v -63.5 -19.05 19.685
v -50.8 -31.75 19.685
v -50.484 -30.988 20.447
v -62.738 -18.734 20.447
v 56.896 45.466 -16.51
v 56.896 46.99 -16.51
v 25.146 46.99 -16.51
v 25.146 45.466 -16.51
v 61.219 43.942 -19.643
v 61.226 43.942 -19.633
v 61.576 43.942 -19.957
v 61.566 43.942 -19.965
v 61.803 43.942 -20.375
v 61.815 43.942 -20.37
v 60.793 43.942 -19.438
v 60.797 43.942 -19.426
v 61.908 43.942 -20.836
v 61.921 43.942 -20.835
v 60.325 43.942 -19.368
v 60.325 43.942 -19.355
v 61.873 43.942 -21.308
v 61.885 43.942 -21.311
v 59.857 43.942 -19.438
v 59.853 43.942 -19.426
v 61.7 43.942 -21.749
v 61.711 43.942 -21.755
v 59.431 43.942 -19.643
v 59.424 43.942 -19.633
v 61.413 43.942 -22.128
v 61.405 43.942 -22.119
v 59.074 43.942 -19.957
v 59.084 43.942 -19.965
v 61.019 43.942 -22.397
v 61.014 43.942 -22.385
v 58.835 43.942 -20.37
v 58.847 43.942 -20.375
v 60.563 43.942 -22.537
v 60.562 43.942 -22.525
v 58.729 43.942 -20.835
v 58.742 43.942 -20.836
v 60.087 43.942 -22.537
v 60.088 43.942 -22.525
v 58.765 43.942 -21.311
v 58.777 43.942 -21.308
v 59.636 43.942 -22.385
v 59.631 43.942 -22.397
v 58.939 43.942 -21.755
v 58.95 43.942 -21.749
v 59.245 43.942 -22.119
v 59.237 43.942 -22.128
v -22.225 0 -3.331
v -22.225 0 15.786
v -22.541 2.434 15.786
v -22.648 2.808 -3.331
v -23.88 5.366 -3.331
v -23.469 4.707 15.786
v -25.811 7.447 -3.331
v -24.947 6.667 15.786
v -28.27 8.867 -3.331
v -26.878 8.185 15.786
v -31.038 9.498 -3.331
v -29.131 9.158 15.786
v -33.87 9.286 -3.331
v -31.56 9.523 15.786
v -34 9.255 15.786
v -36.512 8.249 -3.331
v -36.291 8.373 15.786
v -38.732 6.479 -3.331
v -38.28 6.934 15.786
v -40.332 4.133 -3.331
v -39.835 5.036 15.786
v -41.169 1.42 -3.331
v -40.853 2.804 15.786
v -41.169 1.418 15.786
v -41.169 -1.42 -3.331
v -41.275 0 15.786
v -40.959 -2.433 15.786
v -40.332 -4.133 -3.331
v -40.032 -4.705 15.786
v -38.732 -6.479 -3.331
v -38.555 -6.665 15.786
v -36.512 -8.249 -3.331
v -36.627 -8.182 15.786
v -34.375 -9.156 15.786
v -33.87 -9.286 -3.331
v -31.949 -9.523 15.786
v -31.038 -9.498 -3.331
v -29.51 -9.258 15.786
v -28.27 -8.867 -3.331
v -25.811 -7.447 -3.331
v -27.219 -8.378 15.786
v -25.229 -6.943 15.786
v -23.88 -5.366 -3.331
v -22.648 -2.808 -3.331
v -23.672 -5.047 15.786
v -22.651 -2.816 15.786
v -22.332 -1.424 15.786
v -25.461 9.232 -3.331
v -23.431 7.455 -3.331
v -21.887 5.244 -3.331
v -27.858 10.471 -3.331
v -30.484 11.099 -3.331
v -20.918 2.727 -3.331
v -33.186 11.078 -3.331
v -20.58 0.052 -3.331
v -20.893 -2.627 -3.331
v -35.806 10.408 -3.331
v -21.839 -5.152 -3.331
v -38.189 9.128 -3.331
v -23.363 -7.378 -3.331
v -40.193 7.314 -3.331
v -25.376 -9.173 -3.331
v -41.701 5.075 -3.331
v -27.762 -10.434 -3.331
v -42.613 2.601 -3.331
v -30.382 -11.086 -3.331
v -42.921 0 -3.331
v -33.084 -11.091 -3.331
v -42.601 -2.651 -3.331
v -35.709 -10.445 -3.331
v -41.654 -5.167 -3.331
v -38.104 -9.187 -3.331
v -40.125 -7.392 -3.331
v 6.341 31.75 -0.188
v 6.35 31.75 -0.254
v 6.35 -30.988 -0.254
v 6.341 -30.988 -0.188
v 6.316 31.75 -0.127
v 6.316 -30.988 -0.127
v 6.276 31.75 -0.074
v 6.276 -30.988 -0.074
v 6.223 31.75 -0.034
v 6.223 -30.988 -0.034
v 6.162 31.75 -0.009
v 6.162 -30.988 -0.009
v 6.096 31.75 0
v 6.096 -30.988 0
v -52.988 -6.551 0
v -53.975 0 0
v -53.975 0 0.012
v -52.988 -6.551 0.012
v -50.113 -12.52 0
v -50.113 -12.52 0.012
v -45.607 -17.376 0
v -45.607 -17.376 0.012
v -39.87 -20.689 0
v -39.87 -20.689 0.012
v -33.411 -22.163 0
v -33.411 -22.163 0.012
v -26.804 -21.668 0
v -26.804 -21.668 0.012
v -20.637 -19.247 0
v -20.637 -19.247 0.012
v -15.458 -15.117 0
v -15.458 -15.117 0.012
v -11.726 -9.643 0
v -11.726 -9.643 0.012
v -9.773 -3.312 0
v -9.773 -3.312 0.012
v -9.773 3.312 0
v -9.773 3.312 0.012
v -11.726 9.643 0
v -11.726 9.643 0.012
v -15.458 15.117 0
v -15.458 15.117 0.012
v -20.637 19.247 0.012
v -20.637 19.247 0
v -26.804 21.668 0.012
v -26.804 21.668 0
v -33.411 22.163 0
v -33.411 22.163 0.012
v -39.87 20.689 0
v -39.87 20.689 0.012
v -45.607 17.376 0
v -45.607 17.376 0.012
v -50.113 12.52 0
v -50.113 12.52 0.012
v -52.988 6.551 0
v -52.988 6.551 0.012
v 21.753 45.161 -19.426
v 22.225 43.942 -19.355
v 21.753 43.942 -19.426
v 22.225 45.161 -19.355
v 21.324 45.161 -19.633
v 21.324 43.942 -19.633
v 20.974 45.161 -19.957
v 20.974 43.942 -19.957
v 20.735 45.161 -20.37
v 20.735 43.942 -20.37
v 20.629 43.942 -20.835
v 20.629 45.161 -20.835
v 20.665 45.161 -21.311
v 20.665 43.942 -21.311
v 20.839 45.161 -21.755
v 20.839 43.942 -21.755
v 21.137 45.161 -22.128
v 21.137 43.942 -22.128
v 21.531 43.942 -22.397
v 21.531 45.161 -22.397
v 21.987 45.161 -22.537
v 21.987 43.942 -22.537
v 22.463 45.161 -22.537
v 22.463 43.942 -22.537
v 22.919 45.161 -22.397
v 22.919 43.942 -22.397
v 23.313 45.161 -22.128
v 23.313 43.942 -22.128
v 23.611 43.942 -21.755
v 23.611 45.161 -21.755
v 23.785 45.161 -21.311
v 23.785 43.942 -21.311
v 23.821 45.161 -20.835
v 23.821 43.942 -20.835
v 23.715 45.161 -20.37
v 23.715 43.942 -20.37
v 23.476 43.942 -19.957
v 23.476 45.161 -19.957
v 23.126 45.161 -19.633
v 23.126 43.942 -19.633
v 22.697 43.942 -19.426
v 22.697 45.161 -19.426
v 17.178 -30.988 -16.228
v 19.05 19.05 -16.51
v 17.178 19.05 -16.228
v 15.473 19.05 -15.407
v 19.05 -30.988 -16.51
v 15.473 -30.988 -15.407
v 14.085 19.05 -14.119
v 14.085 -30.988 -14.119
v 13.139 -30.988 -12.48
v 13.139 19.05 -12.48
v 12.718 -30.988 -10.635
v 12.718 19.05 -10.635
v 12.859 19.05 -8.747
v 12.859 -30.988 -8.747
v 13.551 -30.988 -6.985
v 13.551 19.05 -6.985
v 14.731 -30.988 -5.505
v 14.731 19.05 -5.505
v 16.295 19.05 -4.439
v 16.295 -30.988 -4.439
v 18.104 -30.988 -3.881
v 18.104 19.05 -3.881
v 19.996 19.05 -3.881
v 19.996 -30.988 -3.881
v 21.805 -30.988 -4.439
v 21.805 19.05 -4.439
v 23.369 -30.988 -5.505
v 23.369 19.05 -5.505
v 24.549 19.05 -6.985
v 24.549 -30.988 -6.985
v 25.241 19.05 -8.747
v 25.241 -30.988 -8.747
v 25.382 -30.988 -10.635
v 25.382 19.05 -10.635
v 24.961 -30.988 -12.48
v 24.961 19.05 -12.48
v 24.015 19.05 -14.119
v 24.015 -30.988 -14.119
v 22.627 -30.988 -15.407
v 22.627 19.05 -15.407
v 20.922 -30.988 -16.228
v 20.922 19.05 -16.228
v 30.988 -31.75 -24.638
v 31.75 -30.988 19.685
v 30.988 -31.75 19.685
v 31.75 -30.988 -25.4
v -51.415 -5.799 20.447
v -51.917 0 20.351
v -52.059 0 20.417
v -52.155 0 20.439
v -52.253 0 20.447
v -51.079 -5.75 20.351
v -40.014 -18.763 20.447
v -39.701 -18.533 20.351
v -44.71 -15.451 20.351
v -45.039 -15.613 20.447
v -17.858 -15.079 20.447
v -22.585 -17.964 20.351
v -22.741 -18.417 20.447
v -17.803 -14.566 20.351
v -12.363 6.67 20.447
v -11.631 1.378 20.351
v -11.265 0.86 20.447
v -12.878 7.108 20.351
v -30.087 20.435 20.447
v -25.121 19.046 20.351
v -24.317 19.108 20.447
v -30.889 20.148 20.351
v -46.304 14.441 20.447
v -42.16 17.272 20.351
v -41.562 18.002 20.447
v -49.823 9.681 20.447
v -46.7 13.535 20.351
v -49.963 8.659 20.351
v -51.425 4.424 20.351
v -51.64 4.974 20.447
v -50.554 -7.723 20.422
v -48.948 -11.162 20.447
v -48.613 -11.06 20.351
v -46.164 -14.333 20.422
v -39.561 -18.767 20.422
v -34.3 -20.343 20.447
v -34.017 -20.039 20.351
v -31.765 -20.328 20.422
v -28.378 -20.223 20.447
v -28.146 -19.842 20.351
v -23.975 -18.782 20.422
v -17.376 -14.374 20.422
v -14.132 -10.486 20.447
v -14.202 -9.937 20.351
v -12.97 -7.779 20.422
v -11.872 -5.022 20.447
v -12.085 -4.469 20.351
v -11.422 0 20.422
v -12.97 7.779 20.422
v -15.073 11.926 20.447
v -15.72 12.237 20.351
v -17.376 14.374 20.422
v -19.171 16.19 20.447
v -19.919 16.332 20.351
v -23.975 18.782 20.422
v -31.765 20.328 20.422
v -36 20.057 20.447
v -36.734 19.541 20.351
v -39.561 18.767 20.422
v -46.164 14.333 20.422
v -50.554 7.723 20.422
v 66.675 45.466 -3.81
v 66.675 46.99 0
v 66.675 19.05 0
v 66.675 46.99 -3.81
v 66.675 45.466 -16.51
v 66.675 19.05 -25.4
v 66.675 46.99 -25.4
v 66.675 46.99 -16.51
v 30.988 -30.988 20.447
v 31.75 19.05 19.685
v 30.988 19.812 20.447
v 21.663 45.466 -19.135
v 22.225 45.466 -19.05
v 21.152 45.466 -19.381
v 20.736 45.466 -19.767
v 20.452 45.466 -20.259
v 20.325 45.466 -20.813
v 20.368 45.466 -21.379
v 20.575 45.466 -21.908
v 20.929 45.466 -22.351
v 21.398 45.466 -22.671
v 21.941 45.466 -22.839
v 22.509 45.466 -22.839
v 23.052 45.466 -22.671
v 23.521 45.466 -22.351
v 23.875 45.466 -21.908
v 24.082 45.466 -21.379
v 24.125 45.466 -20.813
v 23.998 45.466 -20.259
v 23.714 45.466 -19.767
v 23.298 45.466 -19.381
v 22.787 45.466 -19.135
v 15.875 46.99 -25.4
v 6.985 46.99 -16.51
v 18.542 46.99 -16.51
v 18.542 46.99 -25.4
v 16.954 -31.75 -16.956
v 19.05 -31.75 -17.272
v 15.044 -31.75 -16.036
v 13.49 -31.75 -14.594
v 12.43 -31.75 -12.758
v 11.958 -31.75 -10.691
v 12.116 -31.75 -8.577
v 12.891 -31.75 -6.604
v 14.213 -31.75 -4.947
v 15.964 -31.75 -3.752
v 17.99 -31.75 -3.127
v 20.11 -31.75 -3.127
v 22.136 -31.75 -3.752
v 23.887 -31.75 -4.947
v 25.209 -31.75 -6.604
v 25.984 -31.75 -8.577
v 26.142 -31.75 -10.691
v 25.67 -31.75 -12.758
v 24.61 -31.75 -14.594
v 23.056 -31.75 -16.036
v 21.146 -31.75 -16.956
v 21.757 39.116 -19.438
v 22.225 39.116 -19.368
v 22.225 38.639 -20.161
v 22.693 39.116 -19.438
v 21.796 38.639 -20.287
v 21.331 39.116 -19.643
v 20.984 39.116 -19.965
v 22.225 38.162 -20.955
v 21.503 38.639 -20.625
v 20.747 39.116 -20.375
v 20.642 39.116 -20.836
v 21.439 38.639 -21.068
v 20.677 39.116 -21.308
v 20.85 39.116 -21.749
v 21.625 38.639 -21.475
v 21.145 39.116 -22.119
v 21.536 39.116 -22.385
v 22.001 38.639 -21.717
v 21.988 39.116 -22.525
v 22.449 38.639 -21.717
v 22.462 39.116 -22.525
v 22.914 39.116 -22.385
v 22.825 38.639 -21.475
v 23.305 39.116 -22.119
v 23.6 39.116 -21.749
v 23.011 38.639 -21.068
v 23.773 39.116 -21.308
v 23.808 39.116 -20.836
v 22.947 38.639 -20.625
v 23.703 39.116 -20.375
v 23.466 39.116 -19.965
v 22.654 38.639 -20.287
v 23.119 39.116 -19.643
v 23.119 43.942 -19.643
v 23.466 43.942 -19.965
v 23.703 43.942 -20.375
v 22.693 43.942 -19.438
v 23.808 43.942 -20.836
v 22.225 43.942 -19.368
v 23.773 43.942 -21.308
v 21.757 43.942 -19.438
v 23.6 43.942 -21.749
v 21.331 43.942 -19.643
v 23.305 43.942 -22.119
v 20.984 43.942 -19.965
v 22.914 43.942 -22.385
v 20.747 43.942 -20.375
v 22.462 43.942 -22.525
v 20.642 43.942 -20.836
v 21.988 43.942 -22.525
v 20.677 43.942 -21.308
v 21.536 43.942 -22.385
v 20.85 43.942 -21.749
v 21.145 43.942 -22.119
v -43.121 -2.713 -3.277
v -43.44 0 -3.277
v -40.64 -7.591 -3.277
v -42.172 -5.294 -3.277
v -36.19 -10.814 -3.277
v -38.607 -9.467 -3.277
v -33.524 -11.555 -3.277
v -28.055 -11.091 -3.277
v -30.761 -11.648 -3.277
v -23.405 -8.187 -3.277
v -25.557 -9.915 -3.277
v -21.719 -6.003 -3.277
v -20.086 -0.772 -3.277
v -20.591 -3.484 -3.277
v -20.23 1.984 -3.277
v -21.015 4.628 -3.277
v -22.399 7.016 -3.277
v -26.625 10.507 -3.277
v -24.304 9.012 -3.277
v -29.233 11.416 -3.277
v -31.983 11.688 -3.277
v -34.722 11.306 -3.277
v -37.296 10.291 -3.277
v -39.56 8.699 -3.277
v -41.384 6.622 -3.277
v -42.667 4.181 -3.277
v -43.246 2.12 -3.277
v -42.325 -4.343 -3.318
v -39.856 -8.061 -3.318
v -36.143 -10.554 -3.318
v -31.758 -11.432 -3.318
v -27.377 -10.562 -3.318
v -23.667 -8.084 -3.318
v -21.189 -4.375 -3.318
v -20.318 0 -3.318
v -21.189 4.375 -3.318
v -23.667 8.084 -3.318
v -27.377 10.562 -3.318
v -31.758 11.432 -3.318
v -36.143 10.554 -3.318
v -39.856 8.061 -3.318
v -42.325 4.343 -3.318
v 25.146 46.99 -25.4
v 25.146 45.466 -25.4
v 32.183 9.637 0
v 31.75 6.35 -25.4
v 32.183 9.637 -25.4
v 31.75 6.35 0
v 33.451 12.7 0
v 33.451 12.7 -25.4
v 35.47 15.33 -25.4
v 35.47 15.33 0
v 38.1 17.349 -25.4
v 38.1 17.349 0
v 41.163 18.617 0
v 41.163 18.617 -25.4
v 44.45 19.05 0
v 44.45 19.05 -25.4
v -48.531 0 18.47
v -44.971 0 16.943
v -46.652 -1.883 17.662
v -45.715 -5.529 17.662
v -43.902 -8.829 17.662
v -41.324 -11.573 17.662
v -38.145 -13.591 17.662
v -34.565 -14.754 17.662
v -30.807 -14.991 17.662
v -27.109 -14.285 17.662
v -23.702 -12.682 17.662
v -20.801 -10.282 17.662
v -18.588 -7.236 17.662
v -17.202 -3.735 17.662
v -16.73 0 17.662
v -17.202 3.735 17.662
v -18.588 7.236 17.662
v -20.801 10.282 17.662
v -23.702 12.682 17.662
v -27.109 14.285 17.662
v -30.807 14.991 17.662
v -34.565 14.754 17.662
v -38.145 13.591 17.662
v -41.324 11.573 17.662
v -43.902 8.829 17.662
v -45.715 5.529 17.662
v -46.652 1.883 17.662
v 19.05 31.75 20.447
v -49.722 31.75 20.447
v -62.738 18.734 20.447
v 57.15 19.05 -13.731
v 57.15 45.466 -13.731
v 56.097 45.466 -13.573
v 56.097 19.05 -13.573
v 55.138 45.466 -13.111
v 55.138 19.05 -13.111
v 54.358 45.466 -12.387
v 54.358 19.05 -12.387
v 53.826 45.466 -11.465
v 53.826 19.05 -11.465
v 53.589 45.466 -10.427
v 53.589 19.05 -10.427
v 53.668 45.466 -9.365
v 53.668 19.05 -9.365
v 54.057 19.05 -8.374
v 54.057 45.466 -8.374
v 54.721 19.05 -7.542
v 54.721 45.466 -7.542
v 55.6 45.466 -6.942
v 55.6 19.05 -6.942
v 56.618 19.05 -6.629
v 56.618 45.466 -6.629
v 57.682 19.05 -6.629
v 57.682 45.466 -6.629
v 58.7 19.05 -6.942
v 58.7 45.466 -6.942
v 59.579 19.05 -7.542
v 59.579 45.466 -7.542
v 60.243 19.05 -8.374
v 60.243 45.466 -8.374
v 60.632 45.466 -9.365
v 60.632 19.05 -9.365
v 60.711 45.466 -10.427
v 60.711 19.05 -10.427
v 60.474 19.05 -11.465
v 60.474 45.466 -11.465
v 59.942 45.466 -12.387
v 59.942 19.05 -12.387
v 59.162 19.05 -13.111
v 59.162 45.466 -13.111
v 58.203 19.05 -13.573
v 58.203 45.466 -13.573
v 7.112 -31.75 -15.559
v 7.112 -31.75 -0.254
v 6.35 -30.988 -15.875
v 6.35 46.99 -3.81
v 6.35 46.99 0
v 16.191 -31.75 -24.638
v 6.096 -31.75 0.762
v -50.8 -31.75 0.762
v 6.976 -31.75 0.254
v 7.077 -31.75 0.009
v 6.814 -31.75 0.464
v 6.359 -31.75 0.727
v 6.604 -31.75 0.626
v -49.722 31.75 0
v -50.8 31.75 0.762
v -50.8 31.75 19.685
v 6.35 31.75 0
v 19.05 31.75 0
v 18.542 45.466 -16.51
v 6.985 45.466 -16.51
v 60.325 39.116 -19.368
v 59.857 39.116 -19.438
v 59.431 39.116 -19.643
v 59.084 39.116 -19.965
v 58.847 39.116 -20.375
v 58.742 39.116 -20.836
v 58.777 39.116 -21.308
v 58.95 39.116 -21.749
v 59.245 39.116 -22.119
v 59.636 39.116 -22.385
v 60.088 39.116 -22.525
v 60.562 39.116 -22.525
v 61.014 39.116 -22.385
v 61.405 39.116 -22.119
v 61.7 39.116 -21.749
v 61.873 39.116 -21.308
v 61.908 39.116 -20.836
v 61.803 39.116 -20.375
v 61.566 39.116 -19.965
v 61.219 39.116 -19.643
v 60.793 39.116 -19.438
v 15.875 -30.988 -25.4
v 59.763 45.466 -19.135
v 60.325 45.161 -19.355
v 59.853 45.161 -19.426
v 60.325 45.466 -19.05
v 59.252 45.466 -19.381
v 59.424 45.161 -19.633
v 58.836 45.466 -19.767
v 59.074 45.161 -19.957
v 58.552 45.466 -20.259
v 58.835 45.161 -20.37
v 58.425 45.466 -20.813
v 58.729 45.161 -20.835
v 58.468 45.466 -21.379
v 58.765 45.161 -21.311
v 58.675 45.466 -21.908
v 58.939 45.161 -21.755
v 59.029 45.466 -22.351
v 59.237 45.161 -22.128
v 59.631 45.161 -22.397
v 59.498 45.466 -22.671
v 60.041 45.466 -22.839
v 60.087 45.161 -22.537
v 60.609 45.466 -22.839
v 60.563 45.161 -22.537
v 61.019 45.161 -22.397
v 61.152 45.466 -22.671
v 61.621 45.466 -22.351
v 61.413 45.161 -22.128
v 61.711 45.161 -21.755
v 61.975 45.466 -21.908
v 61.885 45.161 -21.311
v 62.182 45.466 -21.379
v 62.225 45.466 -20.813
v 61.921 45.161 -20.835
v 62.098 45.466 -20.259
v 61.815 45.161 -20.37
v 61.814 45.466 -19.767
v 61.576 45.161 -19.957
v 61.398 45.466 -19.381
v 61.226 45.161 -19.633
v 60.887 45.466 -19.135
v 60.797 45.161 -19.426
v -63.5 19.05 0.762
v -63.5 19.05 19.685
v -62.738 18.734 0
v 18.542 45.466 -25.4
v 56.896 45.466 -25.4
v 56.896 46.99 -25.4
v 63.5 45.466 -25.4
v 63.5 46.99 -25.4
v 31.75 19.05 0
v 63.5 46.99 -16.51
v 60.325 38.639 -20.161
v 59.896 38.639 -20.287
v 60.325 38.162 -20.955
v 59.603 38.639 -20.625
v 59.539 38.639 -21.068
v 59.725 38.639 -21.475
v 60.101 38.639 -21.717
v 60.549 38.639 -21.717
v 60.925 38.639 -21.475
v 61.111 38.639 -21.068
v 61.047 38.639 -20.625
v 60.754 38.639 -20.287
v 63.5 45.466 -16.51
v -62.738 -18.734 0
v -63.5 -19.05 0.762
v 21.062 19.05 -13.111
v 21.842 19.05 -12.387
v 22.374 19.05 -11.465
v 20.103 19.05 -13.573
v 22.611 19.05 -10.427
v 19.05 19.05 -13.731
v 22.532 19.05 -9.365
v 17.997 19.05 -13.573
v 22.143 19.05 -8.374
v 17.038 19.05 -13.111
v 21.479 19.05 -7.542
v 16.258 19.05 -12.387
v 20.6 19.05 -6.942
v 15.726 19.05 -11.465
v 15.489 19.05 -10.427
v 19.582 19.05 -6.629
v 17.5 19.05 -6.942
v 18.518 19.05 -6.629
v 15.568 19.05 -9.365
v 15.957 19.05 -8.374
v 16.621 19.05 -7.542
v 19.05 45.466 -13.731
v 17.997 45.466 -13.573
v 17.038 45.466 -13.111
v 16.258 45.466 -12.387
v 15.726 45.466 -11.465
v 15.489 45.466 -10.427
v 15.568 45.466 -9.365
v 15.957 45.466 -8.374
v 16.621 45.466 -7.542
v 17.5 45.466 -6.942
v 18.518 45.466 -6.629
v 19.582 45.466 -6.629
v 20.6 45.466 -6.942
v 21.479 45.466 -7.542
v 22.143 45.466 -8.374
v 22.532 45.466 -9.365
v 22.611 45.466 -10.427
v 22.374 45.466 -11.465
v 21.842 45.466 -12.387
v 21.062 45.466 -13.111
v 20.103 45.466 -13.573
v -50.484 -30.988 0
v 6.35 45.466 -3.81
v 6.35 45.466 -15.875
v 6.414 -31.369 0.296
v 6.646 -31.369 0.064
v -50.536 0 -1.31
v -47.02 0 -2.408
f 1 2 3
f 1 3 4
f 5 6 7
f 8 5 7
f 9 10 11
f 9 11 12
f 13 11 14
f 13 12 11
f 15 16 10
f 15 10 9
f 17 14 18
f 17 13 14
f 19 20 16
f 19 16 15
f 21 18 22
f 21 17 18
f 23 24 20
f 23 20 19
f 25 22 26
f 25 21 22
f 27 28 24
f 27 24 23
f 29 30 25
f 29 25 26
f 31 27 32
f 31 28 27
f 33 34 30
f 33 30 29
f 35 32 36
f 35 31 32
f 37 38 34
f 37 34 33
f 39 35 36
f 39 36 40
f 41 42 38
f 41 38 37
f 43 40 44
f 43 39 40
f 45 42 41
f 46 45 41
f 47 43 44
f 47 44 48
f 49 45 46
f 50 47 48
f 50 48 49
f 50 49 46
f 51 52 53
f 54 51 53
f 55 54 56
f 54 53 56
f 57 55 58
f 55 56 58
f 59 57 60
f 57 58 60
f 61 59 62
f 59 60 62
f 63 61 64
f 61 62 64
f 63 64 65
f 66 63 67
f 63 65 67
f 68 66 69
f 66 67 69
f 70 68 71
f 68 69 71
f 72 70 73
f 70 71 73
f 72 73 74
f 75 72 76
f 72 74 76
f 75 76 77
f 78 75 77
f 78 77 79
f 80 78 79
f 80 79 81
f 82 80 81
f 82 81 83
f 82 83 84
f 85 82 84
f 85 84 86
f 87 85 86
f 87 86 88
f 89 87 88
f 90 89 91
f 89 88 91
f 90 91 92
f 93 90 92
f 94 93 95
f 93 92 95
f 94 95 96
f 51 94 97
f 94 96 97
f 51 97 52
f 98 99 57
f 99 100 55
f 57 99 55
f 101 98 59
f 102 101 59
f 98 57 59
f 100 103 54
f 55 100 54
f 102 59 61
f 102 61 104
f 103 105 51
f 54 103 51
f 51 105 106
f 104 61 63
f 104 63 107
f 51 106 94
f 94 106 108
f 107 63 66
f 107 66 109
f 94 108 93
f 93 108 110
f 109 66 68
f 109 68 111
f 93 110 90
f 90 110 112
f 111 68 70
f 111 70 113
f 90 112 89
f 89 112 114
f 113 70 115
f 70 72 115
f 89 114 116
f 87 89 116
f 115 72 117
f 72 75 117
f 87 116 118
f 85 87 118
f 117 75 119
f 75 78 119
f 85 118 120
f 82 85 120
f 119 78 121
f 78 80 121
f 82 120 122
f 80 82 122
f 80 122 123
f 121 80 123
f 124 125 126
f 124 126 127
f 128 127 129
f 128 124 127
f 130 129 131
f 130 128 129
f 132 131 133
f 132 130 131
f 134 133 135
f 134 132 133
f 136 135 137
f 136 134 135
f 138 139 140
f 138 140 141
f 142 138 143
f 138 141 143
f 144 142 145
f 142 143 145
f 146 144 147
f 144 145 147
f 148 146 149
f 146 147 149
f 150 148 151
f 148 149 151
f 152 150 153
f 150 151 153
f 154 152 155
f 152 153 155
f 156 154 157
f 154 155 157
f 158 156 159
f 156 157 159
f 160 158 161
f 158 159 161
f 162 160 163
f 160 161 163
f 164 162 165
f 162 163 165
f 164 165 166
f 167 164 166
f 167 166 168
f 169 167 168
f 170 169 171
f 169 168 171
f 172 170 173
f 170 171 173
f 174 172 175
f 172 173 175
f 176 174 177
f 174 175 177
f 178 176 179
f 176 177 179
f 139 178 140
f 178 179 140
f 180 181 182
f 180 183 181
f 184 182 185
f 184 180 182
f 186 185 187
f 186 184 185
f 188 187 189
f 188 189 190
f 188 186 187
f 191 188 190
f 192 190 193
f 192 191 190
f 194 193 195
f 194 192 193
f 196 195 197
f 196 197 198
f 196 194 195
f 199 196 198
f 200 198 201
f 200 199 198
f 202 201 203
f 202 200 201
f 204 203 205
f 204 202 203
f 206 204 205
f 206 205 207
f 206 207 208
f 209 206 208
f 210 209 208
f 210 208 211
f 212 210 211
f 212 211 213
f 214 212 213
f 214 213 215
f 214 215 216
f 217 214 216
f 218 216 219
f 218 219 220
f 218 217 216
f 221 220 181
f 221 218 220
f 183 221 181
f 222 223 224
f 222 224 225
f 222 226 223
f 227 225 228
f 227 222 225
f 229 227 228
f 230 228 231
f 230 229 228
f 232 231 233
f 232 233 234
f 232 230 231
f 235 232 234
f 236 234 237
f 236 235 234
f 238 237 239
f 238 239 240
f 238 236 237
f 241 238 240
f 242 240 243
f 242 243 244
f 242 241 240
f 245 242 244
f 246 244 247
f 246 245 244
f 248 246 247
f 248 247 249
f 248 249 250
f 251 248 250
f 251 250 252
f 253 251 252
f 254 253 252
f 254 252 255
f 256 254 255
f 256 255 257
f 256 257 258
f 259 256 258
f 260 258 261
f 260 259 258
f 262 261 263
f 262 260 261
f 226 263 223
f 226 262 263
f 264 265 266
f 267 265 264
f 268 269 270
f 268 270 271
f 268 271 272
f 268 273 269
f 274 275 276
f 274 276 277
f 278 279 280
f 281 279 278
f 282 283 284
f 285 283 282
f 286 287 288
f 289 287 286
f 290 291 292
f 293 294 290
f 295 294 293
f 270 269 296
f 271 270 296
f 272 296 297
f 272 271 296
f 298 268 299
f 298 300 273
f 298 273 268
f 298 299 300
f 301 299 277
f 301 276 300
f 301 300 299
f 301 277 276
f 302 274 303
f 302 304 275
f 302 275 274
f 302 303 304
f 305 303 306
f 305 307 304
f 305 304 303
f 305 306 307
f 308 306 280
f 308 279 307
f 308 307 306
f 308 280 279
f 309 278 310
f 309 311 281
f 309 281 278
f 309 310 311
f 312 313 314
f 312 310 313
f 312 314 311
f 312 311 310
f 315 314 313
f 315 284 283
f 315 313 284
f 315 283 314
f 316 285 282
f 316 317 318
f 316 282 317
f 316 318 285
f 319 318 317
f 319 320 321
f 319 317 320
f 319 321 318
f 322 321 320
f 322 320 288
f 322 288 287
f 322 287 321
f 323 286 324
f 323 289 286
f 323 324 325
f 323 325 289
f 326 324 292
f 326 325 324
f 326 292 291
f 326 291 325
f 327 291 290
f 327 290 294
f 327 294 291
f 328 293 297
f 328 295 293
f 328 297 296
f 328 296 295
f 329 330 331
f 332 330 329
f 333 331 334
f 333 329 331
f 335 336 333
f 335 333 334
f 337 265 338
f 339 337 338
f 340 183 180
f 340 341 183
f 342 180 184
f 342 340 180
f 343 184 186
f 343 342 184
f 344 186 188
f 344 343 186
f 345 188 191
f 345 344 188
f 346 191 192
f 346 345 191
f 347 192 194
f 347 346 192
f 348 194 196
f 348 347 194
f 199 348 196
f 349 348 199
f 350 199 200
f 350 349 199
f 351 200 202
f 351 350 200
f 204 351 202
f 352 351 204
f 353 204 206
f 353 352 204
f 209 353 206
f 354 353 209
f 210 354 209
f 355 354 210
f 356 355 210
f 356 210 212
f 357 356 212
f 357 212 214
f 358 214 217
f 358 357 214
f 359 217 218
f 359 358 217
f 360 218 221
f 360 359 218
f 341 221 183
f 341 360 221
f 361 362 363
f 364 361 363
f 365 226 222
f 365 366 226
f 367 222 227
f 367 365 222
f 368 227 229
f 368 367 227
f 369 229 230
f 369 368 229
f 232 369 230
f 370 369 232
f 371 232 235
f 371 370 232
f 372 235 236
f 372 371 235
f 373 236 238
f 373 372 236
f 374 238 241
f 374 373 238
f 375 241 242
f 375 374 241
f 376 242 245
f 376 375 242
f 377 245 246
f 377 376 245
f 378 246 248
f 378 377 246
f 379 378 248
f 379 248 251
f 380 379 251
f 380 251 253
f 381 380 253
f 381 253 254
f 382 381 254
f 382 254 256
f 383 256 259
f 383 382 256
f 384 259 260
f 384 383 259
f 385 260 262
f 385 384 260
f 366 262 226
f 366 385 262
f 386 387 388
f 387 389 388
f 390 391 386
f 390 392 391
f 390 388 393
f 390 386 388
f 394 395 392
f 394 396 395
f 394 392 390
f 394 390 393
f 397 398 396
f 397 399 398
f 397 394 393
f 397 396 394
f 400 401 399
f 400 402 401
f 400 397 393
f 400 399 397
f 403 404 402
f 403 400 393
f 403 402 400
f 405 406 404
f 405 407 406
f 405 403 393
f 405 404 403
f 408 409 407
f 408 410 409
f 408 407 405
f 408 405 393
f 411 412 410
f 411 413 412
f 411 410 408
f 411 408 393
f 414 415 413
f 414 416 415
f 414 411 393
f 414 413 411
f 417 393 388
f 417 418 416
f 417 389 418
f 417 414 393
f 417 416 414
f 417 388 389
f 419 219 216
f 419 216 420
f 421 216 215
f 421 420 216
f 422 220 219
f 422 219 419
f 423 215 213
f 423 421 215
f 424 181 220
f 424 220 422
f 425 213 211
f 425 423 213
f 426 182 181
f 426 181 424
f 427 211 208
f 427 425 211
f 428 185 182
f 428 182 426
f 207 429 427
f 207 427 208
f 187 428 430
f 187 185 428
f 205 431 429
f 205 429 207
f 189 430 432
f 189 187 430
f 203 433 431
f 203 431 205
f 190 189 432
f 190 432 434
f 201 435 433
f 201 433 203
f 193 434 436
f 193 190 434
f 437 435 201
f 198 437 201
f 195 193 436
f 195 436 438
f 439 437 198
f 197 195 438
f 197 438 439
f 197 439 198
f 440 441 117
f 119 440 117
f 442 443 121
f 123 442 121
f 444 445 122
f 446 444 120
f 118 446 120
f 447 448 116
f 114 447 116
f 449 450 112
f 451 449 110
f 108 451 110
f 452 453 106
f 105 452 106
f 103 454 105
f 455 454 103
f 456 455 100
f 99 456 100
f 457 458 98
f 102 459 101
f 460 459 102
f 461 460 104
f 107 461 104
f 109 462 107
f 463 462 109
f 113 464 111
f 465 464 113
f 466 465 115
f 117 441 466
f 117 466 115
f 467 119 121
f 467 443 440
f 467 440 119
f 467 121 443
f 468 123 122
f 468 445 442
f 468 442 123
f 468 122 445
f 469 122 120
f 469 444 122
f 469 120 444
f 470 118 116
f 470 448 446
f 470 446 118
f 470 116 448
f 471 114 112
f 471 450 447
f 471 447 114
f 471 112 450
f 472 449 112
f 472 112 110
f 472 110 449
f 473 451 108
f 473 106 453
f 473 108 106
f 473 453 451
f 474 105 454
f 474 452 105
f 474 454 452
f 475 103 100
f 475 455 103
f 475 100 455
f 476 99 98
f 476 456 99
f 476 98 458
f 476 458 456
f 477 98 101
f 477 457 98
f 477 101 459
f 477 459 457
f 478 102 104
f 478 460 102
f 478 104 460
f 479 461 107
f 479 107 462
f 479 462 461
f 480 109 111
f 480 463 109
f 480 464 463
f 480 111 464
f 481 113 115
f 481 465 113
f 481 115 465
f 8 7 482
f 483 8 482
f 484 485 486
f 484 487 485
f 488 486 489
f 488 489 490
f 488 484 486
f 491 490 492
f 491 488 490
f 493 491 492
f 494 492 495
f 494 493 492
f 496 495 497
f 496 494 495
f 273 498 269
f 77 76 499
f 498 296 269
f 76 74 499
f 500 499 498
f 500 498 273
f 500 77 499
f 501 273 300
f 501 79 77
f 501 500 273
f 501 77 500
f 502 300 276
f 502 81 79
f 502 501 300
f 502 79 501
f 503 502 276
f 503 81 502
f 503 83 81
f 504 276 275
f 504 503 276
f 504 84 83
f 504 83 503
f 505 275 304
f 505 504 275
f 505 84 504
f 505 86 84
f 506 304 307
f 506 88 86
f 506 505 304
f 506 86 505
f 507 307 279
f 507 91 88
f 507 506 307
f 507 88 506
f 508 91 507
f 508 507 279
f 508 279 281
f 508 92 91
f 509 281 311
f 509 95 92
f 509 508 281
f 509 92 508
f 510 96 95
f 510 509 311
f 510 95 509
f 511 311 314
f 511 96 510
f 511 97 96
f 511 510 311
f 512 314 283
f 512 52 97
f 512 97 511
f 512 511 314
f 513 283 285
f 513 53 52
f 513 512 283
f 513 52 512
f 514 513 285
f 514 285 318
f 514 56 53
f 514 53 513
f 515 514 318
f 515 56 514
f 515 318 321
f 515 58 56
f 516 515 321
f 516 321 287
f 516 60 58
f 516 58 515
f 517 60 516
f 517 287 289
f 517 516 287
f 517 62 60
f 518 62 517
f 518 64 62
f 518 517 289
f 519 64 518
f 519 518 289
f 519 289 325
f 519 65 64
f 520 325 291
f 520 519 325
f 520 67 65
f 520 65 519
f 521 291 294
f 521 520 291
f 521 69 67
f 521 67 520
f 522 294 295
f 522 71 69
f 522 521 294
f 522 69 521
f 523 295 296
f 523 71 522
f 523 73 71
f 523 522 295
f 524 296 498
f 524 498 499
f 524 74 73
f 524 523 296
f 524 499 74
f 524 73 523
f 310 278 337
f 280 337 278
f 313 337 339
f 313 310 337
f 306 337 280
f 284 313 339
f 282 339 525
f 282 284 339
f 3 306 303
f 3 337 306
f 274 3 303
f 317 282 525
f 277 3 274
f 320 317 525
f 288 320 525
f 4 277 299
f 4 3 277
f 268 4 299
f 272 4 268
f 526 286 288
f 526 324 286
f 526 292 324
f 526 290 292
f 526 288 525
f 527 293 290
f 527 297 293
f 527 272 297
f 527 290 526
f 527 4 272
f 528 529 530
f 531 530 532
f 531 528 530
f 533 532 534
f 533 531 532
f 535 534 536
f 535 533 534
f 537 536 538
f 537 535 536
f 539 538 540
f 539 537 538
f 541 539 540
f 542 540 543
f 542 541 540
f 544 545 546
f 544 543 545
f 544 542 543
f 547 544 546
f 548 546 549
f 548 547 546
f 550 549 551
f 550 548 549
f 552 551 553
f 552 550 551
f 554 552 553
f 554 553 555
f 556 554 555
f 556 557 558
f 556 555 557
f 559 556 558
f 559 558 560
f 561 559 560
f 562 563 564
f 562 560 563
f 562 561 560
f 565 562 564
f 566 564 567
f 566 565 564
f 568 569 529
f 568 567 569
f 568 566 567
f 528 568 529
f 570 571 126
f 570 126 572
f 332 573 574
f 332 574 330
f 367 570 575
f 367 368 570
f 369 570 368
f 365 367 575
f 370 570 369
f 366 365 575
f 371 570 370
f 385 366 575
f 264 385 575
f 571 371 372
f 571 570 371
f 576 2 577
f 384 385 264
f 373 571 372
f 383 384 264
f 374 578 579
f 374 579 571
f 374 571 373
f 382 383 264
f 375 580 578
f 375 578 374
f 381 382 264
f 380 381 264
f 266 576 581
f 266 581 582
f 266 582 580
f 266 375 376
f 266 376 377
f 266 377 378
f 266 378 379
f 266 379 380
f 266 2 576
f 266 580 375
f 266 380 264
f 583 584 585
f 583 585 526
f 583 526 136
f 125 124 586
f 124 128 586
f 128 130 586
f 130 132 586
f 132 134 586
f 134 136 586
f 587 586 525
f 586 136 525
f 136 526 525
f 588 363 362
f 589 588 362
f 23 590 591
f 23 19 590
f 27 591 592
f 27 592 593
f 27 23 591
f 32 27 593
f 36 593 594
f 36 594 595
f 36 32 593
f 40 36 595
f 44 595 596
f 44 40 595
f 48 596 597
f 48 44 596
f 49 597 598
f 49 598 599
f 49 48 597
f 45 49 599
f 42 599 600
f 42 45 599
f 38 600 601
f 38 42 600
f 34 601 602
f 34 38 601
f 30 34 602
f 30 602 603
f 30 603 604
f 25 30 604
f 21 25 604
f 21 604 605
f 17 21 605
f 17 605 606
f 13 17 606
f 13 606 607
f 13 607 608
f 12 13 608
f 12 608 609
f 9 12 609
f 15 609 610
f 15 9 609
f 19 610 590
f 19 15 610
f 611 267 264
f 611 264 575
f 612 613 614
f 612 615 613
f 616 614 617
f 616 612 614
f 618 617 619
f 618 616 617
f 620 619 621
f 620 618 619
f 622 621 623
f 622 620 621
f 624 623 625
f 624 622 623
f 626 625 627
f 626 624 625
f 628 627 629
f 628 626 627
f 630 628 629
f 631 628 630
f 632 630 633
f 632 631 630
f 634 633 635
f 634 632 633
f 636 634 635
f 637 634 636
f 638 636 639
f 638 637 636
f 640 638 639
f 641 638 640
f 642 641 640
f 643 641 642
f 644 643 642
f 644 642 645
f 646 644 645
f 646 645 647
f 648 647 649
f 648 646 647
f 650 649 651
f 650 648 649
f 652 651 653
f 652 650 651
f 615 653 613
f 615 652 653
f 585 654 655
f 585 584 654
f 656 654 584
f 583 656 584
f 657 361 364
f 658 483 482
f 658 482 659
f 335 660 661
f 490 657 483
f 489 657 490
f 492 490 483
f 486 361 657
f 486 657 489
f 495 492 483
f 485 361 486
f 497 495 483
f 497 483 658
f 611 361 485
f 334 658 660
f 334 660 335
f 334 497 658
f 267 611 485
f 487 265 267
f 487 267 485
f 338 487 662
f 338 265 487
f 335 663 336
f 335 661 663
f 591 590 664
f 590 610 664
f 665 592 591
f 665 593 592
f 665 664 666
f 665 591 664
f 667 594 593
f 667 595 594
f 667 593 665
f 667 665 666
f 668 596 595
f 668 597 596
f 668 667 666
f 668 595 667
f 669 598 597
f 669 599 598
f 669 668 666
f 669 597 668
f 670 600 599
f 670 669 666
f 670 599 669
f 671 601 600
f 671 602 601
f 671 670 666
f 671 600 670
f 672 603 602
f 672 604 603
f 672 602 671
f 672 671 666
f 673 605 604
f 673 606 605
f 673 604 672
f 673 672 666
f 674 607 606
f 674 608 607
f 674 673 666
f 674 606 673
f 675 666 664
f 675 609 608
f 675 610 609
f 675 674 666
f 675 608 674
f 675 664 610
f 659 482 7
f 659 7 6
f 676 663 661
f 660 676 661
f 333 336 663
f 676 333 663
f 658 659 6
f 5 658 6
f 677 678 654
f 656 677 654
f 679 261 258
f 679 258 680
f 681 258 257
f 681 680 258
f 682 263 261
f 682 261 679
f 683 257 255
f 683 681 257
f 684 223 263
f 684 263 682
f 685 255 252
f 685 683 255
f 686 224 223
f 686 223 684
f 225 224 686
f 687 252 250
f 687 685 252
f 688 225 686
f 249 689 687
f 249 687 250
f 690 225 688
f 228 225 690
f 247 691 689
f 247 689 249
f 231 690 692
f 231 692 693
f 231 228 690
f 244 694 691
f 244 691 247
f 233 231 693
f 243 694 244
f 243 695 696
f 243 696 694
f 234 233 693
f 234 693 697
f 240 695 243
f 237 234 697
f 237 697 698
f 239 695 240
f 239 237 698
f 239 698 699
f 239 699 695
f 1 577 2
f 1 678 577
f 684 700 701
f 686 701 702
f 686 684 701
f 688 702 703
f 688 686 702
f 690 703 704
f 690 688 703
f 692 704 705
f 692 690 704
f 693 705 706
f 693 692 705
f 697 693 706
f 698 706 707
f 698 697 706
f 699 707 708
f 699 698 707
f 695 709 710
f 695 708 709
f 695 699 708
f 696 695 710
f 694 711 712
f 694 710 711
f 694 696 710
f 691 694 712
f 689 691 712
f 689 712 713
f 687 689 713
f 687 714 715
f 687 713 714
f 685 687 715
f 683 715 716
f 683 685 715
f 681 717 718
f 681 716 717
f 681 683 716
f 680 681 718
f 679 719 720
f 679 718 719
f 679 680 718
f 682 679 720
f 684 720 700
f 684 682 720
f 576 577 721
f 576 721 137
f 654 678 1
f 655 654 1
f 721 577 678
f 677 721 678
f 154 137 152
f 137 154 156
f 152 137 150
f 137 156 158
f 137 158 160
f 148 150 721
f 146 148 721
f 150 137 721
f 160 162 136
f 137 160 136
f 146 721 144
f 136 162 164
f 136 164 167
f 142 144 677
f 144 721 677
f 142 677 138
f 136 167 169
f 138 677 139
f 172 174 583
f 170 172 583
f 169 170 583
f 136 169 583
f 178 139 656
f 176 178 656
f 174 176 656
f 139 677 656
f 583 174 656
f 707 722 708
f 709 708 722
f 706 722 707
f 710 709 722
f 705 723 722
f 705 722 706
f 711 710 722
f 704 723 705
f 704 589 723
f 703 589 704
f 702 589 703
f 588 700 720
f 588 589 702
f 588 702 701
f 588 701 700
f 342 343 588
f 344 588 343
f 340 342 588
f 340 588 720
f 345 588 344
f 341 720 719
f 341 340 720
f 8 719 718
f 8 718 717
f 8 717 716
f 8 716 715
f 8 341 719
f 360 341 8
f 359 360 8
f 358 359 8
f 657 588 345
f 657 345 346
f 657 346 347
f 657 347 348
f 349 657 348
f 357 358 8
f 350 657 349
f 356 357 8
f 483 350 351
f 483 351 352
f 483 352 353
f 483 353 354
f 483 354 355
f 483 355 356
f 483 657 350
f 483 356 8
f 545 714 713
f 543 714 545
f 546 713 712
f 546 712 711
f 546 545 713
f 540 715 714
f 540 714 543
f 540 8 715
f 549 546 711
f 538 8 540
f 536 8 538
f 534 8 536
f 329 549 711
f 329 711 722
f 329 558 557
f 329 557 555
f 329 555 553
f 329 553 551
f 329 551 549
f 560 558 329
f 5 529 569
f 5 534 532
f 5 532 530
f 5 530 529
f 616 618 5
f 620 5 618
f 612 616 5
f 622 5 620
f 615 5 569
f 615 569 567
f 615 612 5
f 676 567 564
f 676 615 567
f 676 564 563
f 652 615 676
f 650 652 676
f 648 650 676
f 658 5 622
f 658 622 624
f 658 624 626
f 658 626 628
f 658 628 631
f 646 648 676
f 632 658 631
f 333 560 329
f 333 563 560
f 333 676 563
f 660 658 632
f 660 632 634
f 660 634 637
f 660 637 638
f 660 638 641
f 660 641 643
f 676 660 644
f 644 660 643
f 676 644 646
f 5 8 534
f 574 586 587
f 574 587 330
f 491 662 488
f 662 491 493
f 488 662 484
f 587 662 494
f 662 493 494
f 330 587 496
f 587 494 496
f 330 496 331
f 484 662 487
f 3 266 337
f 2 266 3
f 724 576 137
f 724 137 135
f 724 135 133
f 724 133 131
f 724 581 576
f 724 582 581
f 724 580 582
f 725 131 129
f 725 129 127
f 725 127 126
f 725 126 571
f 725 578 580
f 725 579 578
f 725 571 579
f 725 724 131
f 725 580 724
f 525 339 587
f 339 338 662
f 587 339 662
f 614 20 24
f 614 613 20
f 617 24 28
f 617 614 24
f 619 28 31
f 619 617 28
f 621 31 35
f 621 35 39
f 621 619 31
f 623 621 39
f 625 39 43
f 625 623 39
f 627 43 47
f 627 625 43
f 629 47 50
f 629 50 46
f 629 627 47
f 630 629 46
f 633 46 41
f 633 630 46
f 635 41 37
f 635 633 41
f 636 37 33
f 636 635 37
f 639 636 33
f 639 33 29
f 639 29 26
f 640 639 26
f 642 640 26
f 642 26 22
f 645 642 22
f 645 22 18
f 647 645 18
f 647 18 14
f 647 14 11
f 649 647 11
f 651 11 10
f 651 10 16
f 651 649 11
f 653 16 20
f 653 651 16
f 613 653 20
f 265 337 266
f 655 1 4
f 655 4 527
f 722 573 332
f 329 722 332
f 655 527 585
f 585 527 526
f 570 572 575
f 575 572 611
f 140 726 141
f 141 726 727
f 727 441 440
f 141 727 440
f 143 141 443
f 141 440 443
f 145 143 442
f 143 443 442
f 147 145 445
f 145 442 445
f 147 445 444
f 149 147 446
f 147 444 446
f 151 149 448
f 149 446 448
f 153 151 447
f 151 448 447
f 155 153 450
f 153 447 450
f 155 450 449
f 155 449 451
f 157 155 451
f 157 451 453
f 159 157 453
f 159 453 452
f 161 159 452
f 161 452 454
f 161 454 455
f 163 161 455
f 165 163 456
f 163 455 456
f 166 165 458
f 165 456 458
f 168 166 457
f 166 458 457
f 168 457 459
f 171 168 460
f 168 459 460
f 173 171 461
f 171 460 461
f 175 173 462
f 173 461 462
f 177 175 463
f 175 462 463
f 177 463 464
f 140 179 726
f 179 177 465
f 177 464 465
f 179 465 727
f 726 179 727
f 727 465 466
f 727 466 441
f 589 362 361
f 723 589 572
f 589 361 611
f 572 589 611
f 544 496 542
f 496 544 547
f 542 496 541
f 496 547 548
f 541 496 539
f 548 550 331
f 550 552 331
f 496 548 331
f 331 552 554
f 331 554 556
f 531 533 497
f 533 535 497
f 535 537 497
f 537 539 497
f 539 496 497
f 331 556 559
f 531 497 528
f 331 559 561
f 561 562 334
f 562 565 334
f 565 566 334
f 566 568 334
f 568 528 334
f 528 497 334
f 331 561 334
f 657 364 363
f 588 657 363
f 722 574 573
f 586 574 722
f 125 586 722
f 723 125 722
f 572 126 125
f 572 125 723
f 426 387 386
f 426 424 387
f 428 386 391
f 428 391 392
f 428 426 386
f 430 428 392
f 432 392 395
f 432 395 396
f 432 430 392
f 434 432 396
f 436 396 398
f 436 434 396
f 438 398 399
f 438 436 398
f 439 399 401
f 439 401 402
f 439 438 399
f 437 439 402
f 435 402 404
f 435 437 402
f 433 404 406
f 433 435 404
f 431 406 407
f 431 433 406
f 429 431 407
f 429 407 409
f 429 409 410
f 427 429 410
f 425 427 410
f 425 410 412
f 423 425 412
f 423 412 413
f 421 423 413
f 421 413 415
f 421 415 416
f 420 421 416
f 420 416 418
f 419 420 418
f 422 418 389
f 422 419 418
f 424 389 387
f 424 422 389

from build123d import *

# Parameters (mm, degrees)
SKETCH1_W                          = 25.4
SKETCH1_H                          = 76.2
EXTRUDE1_DEPTH                     = 20.447
SKETCH60_W                         = 25.4
SKETCH60_H                         = 63.5
EXTRUDE6_DEPTH                     = 63.5
SKETCH69_W                         = 63.5
SKETCH69_H                         = 63.5
SKETCH69_R                         = 22.225
CUT_EXTRUDE23_DEPTH                = 4.953
SKETCH71_R                         = 9.525
CUT_EXTRUDE24_DEPTH                = 24.778013047
SKETCH80_W                         = 20.447
SKETCH80_H                         = 76.2
EXTRUDE11_DEPTH                    = 6.35
SKETCH76_W                         = 25.4
SKETCH76_H                         = 76.2
EXTRUDE9_DEPTH                     = 25.4
SKETCH79_W                         = 50.8
SKETCH79_H                         = 6.35
EXTRUDE10_DEPTH                    = 46.847
SKETCH84_W                         = 60.325
SKETCH84_H                         = 25.4
EXTRUDE14_DEPTH                    = 15.24
EXTRUDE14_DEPTH_BACK               = 12.7
EXTRUDE15_DEPTH                    = 1.524
CBORE_FOR_1_8_PRESS_PIN_AT_2_COUNT = 2
CBORE_FOR_1_8_PRESS_PIN_AT_2_PITCH = 38.1
CHAMFER5_SIZE                      = 9.525
FILLET6_R                          = 12.7
CHAMFER3_SIZE                      = 12.7
FILLET7_R                          = 0.254
CHAMFER4_SIZE                      = 0.762
FILLET4_R                          = 2.54
FILLET5_R                          = 0.635


with BuildPart() as part:
    # Sketch1 → Extrude1 (new body)
    with BuildSketch(Plane.XY):
        with Locations((12.7, 0)):
            Rectangle(SKETCH1_W, SKETCH1_H)
    extrude(amount=EXTRUDE1_DEPTH)

    # Sketch60 → Extrude6 (add)
    with BuildSketch(Plane.ZY):
        with Locations((7.747, 0)):
            Rectangle(SKETCH60_W, SKETCH60_H)
    extrude(amount=EXTRUDE6_DEPTH)

    # Sketch64 → Cut-Revolve1 (revolve, cut)
    with BuildSketch(Plane(origin=(0, 0, 0), x_dir=(-1, 0, 0), z_dir=(0, 1, 0)), mode=Mode.PRIVATE) as cut_revolve1_sk:
        with BuildLine():
            Line((9.525, -4.953), (9.525, 0.012163278))
            ThreePointArc((9.525, 0.012163278), (14.839678796, -1.926851671), (20.32, -3.331013047))
            Line((20.32, -3.331013047), (31.75, -3.331013047))
            Line((31.75, -3.331013047), (31.75, -4.953))
            Line((31.75, -4.953), (9.525, -4.953))
        make_face()
        with BuildLine():
            Line((31.75, 20.447), (11.43, 20.447))
            ThreePointArc((11.43, 20.447), (21.174424434, 16.073156441), (31.75, 14.575986953))
            Line((31.75, 14.575986953), (31.75, 20.447))
        make_face()
    revolve(cut_revolve1_sk.sketch.rotate(Axis((-31.75, 0, 14.575986953), (0, 0, 1)), 180), axis=Axis((-31.75, 0, 14.575986953), (0, 0, 1)), mode=Mode.SUBTRACT)  # turned: the seam where the file's is

    # Sketch69 → Cut-Extrude23 (cut)
    with BuildSketch(Plane(origin=(0, 0, -4.953), x_dir=(-1, 0, 0), z_dir=(0, 0, -1))):
        with Locations((31.75, 0)):
            Rectangle(SKETCH69_W, SKETCH69_H)
        with Locations((31.75, 0)):
            Circle(SKETCH69_R, mode=Mode.SUBTRACT)
    extrude(amount=-CUT_EXTRUDE23_DEPTH, mode=Mode.SUBTRACT)

    # Sketch71 → Cut-Extrude24 (cut, through all)
    with BuildSketch(Plane.XY.offset(20.447)):
        with Locations((-31.75, 0)):
            Circle(SKETCH71_R)
    extrude(amount=-CUT_EXTRUDE24_DEPTH, mode=Mode.SUBTRACT)

    # Sketch80 → Extrude11 (add)
    with BuildSketch(Plane(origin=(25.4, 0, 0), x_dir=(0, 0, -1), z_dir=(1, 0, 0))):
        with Locations((-10.2235, 0)):
            Rectangle(SKETCH80_W, SKETCH80_H)
    extrude(amount=EXTRUDE11_DEPTH)

    # Sketch76 → Extrude9 (add)
    with BuildSketch(Plane(origin=(0, 0, 0), x_dir=(-1, 0, 0), z_dir=(0, 0, -1))):
        with Locations((-19.05, 0)):
            Rectangle(SKETCH76_W, SKETCH76_H)
    extrude(amount=EXTRUDE9_DEPTH)

    # Sketch79 → Extrude10 (cut, through all)
    with BuildSketch(Plane.XY.offset(20.447)):
        with Locations((6.35, -34.925)):
            Rectangle(SKETCH79_W, SKETCH79_H)
        with Locations((6.35, 34.925)):
            Rectangle(SKETCH79_W, SKETCH79_H)
    extrude(amount=-EXTRUDE10_DEPTH, mode=Mode.SUBTRACT)

    # Sketch84 → Extrude14 (add, two sides)
    with BuildSketch(Plane(origin=(0, 31.75, 0), x_dir=(1, 0, 0), z_dir=(0, 1, 0))) as extrude14_sk:
        with Locations((36.5125, 12.7)):
            Rectangle(SKETCH84_W, SKETCH84_H)
    extrude(amount=EXTRUDE14_DEPTH)
    extrude(extrude14_sk.sketch, amount=-EXTRUDE14_DEPTH_BACK)

    # Sketch85 → CBORE for 1_4 Socket Head Cap Screw1 (revolve, cut)
    with BuildSketch(Plane(origin=(19.05, -31.75, -10.16), x_dir=(0, 0, -1), z_dir=(1, 0, 0))):
        Polygon((0, 0), (0, 78.74), (4.20624, 78.74), (3.57124, 78.105), (3.57124, 50.8), (6.35, 50.8), (6.35, 0.762), (7.112, 0), align=None)
    revolve(axis=Axis((19.05, -38.1, -10.16), (0, 1, 0)), mode=Mode.SUBTRACT)

    # Sketch87 → 1_4 Clearance Hole2 (revolve, cut)
    with BuildSketch(Plane(origin=(57.15, 19.05, -10.16), x_dir=(0, 0, -1), z_dir=(1, 0, 0))):
        Polygon((0, 0), (0, 27.94), (4.20624, 27.94), (3.57124, 27.305), (3.57124, 0), align=None)
    revolve(axis=Axis((57.15, 12.7, -10.16), (0, 1, 0)), mode=Mode.SUBTRACT)

    # Sketch89 → Extrude15 (cut)
    with BuildSketch(Plane(origin=(0, 46.99, 0), x_dir=(1, 0, 0), z_dir=(0, 1, 0))):
        Polygon((6.35, 3.81), (66.675, 3.81), (66.675, 16.51), (63.5, 16.51), (63.5, 25.4), (56.896, 25.4), (56.896, 16.51), (25.146, 16.51), (25.146, 25.4), (18.542, 25.4), (18.542, 16.51), (6.35, 16.51), align=None)
    extrude(amount=-EXTRUDE15_DEPTH, mode=Mode.SUBTRACT)

    # Sketch90 → CBORE for 1_8_ Press Pin (revolve, cut)
    with BuildSketch(Plane(origin=(22.225, 45.466, -20.955), x_dir=(0, 0, 1), z_dir=(1, 0, 0))):
        Polygon((0, 0), (0, 7.303866233), (1.5875, 6.35), (1.5875, 1.524), (1.6002, 1.524), (1.6002, 0.3048), (1.905, 0), align=None)
    cbore_for_1_8_press_pin = revolve(axis=Axis((22.225, 51.816, -20.955), (0, -1, 0)), mode=Mode.SUBTRACT)

    # CBORE for 1_8_ Press Pin at 2: CBORE for 1_8_ Press Pin ×2
    with Locations(*[(i * CBORE_FOR_1_8_PRESS_PIN_AT_2_PITCH, 0, 0) for i in range(1, CBORE_FOR_1_8_PRESS_PIN_AT_2_COUNT)]):
        add(cbore_for_1_8_press_pin, mode=Mode.SUBTRACT)

    # Chamfer5
    chamfer5_edges = [part.edges().sort_by_distance(p)[0] for p in [
        (6.35, 7.62, -25.4),
    ]]
    chamfer(chamfer5_edges, length=CHAMFER5_SIZE)

    # Fillet6
    fillet6_edges = [part.edges().sort_by_distance(p)[0] for p in [
        (31.75, 19.05, -12.7),
    ]]
    fillet(fillet6_edges, radius=FILLET6_R)

    # Chamfer3
    chamfer3_edges = [part.edges().sort_by_distance(p)[0] for p in [
        (-63.5, 31.75, 10.2235),
        (-63.5, -31.75, 10.2235),
        (31.75, 31.75, 10.2235),
    ]]
    chamfer(chamfer3_edges, length=CHAMFER3_SIZE)

    # Fillet7
    fillet7_edges = [part.edges().sort_by_distance(p)[0] for p in [
        (6.35, 0, 0),
    ]]
    fillet(fillet7_edges, radius=FILLET7_R)

    # Chamfer4
    chamfer4_edges = [part.edges().sort_by_distance(p)[0] for p in [
        (23.8125, -31.75, -25.4),
        (-9.525, -31.75, 20.447),
        (31.75, -6.35, 20.447),
        (31.75, -31.75, -2.4765),
        (-22.352, -31.75, 0),
        (6.275605122, -31.75, -0.074394878),
        (6.35, -31.75, -8.0645),
        (-57.15, 25.4, 20.447),
        (-57.15, 25.4, 0),
        (-57.15, -25.4, 0),
        (-57.15, -25.4, 20.447),
        (-63.5, 0, 20.447),
        (-63.5, 0, 0),
        (11.1125, -31.75, -20.6375),
    ]]
    chamfer(chamfer4_edges, length=CHAMFER4_SIZE)

    # Fillet4
    fillet4_edges = [part.edges().sort_by_distance(p)[0] for p in [
        (-20.32, 0, -3.331013047),
    ]]
    fillet(fillet4_edges, radius=FILLET4_R)

    # Fillet5
    fillet5_edges = [part.edges().sort_by_distance(p)[0] for p in [
        (-11.43, 0, 20.447),
    ]]
    fillet(fillet5_edges, radius=FILLET5_R)


solid = part.part
